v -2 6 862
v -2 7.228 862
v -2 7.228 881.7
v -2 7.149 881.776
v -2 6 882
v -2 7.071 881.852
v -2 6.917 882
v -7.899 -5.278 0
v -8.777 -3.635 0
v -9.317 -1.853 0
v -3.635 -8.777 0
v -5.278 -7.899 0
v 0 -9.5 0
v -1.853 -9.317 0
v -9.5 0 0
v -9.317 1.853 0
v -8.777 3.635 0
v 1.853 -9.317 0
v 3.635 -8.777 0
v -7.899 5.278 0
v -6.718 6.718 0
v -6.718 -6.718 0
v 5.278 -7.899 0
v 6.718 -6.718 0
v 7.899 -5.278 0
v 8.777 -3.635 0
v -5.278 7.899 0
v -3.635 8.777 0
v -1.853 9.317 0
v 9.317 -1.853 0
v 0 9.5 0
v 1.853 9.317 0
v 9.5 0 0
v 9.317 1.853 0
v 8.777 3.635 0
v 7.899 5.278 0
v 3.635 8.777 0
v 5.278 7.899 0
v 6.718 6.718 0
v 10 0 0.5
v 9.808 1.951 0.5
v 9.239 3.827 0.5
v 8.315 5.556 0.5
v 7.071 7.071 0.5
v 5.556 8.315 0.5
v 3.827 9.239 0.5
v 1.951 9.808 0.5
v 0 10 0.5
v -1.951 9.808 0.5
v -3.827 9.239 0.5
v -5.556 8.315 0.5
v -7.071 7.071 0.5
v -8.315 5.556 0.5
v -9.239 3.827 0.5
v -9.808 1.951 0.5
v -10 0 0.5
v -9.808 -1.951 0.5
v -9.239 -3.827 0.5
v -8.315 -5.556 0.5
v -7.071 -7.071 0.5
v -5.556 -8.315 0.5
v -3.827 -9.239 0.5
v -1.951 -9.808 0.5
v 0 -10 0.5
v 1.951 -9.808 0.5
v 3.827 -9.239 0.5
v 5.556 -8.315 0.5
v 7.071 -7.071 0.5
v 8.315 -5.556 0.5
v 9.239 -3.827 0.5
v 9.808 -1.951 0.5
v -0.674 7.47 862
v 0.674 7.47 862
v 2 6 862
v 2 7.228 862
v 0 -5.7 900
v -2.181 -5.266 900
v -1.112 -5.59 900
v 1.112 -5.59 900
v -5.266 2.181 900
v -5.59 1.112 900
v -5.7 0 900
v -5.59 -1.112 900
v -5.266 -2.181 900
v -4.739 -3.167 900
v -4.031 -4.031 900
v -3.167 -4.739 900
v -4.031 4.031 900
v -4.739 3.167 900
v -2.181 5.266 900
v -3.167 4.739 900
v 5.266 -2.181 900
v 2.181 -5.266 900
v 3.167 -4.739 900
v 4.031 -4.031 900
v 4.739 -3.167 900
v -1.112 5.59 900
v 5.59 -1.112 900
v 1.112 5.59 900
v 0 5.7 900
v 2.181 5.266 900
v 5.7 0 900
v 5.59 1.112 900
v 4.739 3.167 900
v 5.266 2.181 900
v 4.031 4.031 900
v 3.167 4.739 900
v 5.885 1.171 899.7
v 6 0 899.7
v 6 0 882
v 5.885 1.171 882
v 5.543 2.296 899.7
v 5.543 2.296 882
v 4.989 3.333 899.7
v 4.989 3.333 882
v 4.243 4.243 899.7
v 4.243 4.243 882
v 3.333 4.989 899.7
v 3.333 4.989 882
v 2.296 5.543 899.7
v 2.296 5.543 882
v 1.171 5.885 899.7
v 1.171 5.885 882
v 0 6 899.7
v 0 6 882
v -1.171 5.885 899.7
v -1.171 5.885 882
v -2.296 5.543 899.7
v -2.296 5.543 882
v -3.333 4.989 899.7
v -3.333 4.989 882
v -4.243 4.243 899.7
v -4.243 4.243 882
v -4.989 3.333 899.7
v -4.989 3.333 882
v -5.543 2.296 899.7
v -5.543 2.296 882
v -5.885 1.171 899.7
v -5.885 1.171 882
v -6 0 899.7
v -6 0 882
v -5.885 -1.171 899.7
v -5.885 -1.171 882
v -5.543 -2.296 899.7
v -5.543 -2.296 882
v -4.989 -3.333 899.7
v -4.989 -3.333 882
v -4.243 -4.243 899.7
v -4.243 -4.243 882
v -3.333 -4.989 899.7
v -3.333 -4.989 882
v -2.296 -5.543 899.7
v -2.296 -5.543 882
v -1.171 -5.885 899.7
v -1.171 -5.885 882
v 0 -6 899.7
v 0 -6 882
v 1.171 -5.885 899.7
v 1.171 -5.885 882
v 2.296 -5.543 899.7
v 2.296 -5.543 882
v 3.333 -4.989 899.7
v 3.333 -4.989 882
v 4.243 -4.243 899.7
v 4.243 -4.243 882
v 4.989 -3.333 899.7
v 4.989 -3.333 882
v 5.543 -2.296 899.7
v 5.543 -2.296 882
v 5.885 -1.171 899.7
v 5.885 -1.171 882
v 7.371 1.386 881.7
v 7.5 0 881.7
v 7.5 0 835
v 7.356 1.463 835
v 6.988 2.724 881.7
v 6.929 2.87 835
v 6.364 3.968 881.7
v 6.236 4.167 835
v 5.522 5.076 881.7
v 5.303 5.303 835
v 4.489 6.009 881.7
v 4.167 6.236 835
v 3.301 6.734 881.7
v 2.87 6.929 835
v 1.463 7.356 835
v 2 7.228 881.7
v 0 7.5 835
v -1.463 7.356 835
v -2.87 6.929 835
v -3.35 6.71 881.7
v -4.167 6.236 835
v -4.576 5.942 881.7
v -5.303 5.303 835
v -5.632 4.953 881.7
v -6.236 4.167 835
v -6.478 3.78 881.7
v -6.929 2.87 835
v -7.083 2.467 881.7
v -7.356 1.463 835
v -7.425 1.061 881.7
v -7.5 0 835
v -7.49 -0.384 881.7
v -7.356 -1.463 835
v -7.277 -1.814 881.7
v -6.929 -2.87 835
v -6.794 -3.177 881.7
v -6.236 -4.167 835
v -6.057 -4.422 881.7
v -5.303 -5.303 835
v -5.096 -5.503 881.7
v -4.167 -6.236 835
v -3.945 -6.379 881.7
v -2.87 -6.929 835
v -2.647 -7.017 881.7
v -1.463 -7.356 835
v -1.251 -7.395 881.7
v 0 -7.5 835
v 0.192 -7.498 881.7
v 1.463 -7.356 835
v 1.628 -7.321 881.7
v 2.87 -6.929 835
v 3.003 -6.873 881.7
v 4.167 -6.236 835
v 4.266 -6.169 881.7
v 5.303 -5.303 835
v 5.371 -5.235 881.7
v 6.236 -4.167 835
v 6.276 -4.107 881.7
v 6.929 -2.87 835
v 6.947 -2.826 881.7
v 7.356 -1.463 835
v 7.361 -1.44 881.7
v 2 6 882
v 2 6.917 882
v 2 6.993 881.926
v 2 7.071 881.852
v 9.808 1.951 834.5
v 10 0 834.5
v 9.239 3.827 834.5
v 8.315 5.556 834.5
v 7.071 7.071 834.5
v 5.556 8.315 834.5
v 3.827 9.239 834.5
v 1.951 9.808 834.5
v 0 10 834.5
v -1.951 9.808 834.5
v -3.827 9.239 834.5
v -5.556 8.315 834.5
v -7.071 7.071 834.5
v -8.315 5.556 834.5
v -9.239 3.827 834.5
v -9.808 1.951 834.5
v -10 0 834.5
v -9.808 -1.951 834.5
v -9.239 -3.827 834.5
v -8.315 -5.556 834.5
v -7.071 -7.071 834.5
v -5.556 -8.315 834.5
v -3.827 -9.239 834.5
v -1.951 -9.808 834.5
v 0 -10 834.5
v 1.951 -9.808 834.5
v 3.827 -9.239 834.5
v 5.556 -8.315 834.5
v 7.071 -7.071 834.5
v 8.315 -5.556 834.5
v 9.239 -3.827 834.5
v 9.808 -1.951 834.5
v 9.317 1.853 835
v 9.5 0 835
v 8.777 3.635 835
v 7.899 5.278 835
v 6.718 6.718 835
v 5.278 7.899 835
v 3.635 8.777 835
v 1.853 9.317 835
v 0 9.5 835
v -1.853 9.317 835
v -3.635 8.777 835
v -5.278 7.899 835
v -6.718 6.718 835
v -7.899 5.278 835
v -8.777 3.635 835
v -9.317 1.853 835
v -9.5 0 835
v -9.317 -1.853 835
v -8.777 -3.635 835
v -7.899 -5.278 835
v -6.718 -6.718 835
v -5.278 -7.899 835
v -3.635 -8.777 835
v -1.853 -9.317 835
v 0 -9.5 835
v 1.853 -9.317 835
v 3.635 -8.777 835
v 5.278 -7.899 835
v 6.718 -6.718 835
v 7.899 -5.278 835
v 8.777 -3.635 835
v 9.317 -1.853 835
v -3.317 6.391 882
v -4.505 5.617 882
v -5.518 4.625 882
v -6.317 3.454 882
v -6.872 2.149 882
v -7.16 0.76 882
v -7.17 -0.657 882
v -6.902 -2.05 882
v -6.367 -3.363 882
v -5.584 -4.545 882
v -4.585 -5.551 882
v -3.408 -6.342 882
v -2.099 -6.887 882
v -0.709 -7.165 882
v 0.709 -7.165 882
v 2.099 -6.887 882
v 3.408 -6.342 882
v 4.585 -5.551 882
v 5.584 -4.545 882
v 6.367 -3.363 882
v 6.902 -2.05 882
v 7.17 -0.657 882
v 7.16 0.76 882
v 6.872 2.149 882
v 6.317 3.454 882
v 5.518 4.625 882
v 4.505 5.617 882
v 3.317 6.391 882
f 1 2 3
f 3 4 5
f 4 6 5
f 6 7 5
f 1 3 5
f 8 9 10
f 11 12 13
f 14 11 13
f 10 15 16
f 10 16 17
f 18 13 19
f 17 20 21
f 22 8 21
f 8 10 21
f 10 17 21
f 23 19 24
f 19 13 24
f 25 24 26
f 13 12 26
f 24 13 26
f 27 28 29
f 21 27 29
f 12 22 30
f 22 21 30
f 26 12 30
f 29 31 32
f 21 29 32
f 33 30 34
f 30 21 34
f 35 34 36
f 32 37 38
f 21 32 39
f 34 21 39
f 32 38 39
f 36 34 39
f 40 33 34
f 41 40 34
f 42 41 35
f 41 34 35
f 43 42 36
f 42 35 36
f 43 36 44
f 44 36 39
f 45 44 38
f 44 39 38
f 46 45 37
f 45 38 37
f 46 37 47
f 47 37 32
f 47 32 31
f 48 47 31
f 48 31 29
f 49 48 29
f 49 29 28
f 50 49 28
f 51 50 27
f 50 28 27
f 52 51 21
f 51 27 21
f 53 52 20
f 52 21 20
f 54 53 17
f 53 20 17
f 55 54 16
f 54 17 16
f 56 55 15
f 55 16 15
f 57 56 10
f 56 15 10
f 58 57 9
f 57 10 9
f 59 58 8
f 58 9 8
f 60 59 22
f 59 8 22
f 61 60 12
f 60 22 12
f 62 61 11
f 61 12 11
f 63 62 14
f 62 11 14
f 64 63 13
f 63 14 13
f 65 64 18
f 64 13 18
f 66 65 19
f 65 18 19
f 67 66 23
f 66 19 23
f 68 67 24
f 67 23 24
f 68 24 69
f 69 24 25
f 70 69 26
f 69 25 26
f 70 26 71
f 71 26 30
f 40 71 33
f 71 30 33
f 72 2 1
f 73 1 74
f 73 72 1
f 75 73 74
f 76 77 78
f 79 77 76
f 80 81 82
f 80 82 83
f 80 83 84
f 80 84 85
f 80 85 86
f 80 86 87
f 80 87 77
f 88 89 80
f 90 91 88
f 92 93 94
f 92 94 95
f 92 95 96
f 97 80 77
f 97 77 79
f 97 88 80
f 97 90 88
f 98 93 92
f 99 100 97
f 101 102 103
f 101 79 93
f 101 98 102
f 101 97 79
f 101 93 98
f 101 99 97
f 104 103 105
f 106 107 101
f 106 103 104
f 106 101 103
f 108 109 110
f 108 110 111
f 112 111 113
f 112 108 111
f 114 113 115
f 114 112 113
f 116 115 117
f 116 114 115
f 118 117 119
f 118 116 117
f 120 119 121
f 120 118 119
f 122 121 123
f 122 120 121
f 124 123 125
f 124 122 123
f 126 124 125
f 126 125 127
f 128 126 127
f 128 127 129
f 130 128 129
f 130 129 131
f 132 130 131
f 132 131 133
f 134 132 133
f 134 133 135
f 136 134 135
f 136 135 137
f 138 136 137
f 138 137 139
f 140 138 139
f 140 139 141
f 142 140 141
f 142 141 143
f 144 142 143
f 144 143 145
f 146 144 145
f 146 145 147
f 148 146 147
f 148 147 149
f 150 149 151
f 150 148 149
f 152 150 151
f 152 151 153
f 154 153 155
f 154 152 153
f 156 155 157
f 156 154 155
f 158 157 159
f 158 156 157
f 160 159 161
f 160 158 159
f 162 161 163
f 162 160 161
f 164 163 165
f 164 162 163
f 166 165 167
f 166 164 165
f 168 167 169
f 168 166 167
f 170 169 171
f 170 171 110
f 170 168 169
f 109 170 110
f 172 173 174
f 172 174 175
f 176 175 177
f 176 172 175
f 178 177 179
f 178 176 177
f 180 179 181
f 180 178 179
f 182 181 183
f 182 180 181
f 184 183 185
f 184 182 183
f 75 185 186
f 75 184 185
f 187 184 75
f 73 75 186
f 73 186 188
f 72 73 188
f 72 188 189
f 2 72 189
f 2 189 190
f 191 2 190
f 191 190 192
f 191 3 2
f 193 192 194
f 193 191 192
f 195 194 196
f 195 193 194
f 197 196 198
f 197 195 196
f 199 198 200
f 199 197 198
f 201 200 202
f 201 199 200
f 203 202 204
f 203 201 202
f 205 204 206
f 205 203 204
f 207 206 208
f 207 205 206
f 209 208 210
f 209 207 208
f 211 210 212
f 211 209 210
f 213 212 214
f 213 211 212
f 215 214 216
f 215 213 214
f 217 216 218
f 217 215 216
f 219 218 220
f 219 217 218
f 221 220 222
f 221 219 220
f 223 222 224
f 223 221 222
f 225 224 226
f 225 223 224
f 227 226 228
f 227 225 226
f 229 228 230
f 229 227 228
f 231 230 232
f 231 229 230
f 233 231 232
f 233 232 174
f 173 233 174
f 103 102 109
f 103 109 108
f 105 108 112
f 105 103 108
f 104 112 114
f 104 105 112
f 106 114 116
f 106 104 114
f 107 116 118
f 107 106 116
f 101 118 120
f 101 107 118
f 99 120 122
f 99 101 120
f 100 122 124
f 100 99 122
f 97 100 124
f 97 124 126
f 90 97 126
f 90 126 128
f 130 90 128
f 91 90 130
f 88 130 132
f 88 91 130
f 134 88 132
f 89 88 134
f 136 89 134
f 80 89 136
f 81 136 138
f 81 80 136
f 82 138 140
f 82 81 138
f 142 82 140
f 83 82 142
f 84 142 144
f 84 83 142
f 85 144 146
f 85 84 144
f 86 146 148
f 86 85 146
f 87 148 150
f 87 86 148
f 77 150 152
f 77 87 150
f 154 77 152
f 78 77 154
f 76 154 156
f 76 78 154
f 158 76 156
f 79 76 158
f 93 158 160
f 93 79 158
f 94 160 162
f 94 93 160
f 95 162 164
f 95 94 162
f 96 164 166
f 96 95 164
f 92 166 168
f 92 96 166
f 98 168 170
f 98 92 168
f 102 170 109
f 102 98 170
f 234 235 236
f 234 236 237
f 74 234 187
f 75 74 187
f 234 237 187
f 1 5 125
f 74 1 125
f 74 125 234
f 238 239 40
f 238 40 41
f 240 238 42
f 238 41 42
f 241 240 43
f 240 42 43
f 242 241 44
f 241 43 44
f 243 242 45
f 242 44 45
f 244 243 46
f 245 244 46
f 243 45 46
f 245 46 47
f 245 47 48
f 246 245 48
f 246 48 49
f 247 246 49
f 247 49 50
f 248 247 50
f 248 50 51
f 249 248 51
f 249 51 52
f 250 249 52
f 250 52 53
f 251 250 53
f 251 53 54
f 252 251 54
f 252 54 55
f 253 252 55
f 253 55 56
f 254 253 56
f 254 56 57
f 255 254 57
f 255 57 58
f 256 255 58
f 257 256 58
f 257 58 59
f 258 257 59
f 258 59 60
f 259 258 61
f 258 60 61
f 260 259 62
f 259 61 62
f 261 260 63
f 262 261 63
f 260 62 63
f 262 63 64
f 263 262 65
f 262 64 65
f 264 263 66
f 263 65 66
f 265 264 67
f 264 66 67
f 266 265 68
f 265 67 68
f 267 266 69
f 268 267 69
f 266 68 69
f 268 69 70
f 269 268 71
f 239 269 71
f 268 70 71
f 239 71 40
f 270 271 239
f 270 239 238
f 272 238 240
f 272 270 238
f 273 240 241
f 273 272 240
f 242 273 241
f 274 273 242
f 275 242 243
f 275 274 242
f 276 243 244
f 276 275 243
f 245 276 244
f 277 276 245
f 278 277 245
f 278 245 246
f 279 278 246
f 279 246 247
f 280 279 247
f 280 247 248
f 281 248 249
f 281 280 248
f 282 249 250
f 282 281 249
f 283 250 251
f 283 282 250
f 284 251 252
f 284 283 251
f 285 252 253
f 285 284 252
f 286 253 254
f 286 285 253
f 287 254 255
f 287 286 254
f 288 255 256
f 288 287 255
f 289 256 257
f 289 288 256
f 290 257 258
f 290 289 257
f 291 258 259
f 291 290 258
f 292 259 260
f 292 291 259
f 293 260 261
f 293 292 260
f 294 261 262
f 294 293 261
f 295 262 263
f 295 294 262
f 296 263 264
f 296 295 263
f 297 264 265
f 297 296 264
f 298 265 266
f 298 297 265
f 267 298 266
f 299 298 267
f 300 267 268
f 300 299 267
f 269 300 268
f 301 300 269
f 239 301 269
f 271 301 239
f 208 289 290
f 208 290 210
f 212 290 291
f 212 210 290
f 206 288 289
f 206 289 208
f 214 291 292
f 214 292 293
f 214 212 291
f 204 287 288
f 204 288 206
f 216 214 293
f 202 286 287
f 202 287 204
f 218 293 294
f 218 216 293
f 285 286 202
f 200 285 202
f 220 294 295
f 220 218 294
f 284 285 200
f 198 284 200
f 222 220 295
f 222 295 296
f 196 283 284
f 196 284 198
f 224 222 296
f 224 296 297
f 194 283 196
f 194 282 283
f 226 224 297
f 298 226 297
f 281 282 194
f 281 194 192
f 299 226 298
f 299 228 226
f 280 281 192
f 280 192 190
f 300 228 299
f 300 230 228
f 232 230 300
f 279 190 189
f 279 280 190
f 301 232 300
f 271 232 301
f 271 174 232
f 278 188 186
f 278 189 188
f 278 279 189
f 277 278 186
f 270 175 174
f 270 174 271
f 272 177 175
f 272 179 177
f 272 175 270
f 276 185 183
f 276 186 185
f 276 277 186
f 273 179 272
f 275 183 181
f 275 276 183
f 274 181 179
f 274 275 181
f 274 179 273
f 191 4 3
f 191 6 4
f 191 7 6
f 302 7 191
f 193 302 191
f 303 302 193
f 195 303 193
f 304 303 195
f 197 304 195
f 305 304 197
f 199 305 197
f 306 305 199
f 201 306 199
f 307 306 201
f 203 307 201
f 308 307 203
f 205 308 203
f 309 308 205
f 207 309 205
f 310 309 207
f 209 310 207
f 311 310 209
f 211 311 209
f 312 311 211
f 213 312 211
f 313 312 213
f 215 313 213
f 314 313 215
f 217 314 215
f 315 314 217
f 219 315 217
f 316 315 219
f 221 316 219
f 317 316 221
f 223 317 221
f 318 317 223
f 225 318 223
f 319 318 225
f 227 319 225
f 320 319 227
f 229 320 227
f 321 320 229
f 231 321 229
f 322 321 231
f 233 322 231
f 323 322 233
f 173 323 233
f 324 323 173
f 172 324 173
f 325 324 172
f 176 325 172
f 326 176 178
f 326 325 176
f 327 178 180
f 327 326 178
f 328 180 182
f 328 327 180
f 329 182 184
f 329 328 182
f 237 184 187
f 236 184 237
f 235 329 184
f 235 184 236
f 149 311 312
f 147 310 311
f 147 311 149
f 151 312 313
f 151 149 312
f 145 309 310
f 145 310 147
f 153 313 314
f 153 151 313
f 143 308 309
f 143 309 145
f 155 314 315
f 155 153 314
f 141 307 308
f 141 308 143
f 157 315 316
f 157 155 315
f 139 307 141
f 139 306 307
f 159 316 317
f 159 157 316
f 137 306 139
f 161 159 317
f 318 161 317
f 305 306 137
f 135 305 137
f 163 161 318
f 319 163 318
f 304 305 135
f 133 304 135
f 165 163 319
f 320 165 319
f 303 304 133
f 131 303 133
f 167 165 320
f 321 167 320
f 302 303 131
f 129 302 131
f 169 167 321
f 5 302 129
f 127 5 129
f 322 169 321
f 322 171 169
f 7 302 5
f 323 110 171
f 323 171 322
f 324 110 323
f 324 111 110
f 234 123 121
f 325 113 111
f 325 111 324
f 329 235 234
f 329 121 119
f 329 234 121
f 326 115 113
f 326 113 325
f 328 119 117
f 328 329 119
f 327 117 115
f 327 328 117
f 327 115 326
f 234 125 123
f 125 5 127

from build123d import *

# Parameters (mm, degrees)
SZKIC1_R                    = 10
DODANIE_WYCI_GNI_CIE1_DEPTH = 900
SZKIC2_R                    = 10
SZKIC2_R_2                  = 7.5
WYTNIJ_WYCI_GNI_CIE1_DEPTH  = 65
SZKIC3_R                    = 10
SZKIC3_R_2                  = 6
WYTNIJ_WYCI_GNI_CIE2_DEPTH  = 18
SFAZOWANIE1_SIZE            = 0.5
SFAZOWANIE2_SIZE            = 0.3
SFAZOWANIE3_SIZE            = 0.5
WYTNIJ_WYCI_GNI_CIE3_DEPTH  = 20


with BuildPart() as part:
    # Szkic1 → Dodanie-wyciągnięcie1 (new body)
    with BuildSketch(Plane.XY):
        Circle(SZKIC1_R)
    extrude(amount=DODANIE_WYCI_GNI_CIE1_DEPTH)

    # Szkic2 → Wytnij-wyciągnięcie1 (cut)
    with BuildSketch(Plane.XY.offset(900)):
        Circle(SZKIC2_R)
        Circle(SZKIC2_R_2, mode=Mode.SUBTRACT)
    extrude(amount=-WYTNIJ_WYCI_GNI_CIE1_DEPTH, mode=Mode.SUBTRACT)

    # Szkic3 → Wytnij-wyciągnięcie2 (cut)
    with BuildSketch(Plane.XY.offset(900)):
        Circle(SZKIC3_R)
        Circle(SZKIC3_R_2, mode=Mode.SUBTRACT)
    extrude(amount=-WYTNIJ_WYCI_GNI_CIE2_DEPTH, mode=Mode.SUBTRACT)

    # Sfazowanie1
    sfazowanie1_edges = [part.edges().sort_by_distance(p)[0] for p in [
        (-10, 0, 835),
    ]]
    chamfer(sfazowanie1_edges, length=SFAZOWANIE1_SIZE)

    # Sfazowanie2
    sfazowanie2_edges = [part.edges().sort_by_distance(p)[0] for p in [
        (-7.5, 0, 882),
        (-6, 0, 900),
    ]]
    chamfer(sfazowanie2_edges, length=SFAZOWANIE2_SIZE)

    # Sfazowanie3
    sfazowanie3_edges = [part.edges().sort_by_distance(p)[0] for p in [
        (-10, 0, 0),
    ]]
    chamfer(sfazowanie3_edges, length=SFAZOWANIE3_SIZE)

    # Szkic4 → Wytnij-wyciągnięcie3 (cut)
    with BuildSketch(Plane.XY.offset(882)):
        Polygon((0, 6), (2, 6), (2, 8.058022447), (-2, 8.058022447), (-2, 6), align=None)
    extrude(amount=-WYTNIJ_WYCI_GNI_CIE3_DEPTH, mode=Mode.SUBTRACT)


solid = part.part
